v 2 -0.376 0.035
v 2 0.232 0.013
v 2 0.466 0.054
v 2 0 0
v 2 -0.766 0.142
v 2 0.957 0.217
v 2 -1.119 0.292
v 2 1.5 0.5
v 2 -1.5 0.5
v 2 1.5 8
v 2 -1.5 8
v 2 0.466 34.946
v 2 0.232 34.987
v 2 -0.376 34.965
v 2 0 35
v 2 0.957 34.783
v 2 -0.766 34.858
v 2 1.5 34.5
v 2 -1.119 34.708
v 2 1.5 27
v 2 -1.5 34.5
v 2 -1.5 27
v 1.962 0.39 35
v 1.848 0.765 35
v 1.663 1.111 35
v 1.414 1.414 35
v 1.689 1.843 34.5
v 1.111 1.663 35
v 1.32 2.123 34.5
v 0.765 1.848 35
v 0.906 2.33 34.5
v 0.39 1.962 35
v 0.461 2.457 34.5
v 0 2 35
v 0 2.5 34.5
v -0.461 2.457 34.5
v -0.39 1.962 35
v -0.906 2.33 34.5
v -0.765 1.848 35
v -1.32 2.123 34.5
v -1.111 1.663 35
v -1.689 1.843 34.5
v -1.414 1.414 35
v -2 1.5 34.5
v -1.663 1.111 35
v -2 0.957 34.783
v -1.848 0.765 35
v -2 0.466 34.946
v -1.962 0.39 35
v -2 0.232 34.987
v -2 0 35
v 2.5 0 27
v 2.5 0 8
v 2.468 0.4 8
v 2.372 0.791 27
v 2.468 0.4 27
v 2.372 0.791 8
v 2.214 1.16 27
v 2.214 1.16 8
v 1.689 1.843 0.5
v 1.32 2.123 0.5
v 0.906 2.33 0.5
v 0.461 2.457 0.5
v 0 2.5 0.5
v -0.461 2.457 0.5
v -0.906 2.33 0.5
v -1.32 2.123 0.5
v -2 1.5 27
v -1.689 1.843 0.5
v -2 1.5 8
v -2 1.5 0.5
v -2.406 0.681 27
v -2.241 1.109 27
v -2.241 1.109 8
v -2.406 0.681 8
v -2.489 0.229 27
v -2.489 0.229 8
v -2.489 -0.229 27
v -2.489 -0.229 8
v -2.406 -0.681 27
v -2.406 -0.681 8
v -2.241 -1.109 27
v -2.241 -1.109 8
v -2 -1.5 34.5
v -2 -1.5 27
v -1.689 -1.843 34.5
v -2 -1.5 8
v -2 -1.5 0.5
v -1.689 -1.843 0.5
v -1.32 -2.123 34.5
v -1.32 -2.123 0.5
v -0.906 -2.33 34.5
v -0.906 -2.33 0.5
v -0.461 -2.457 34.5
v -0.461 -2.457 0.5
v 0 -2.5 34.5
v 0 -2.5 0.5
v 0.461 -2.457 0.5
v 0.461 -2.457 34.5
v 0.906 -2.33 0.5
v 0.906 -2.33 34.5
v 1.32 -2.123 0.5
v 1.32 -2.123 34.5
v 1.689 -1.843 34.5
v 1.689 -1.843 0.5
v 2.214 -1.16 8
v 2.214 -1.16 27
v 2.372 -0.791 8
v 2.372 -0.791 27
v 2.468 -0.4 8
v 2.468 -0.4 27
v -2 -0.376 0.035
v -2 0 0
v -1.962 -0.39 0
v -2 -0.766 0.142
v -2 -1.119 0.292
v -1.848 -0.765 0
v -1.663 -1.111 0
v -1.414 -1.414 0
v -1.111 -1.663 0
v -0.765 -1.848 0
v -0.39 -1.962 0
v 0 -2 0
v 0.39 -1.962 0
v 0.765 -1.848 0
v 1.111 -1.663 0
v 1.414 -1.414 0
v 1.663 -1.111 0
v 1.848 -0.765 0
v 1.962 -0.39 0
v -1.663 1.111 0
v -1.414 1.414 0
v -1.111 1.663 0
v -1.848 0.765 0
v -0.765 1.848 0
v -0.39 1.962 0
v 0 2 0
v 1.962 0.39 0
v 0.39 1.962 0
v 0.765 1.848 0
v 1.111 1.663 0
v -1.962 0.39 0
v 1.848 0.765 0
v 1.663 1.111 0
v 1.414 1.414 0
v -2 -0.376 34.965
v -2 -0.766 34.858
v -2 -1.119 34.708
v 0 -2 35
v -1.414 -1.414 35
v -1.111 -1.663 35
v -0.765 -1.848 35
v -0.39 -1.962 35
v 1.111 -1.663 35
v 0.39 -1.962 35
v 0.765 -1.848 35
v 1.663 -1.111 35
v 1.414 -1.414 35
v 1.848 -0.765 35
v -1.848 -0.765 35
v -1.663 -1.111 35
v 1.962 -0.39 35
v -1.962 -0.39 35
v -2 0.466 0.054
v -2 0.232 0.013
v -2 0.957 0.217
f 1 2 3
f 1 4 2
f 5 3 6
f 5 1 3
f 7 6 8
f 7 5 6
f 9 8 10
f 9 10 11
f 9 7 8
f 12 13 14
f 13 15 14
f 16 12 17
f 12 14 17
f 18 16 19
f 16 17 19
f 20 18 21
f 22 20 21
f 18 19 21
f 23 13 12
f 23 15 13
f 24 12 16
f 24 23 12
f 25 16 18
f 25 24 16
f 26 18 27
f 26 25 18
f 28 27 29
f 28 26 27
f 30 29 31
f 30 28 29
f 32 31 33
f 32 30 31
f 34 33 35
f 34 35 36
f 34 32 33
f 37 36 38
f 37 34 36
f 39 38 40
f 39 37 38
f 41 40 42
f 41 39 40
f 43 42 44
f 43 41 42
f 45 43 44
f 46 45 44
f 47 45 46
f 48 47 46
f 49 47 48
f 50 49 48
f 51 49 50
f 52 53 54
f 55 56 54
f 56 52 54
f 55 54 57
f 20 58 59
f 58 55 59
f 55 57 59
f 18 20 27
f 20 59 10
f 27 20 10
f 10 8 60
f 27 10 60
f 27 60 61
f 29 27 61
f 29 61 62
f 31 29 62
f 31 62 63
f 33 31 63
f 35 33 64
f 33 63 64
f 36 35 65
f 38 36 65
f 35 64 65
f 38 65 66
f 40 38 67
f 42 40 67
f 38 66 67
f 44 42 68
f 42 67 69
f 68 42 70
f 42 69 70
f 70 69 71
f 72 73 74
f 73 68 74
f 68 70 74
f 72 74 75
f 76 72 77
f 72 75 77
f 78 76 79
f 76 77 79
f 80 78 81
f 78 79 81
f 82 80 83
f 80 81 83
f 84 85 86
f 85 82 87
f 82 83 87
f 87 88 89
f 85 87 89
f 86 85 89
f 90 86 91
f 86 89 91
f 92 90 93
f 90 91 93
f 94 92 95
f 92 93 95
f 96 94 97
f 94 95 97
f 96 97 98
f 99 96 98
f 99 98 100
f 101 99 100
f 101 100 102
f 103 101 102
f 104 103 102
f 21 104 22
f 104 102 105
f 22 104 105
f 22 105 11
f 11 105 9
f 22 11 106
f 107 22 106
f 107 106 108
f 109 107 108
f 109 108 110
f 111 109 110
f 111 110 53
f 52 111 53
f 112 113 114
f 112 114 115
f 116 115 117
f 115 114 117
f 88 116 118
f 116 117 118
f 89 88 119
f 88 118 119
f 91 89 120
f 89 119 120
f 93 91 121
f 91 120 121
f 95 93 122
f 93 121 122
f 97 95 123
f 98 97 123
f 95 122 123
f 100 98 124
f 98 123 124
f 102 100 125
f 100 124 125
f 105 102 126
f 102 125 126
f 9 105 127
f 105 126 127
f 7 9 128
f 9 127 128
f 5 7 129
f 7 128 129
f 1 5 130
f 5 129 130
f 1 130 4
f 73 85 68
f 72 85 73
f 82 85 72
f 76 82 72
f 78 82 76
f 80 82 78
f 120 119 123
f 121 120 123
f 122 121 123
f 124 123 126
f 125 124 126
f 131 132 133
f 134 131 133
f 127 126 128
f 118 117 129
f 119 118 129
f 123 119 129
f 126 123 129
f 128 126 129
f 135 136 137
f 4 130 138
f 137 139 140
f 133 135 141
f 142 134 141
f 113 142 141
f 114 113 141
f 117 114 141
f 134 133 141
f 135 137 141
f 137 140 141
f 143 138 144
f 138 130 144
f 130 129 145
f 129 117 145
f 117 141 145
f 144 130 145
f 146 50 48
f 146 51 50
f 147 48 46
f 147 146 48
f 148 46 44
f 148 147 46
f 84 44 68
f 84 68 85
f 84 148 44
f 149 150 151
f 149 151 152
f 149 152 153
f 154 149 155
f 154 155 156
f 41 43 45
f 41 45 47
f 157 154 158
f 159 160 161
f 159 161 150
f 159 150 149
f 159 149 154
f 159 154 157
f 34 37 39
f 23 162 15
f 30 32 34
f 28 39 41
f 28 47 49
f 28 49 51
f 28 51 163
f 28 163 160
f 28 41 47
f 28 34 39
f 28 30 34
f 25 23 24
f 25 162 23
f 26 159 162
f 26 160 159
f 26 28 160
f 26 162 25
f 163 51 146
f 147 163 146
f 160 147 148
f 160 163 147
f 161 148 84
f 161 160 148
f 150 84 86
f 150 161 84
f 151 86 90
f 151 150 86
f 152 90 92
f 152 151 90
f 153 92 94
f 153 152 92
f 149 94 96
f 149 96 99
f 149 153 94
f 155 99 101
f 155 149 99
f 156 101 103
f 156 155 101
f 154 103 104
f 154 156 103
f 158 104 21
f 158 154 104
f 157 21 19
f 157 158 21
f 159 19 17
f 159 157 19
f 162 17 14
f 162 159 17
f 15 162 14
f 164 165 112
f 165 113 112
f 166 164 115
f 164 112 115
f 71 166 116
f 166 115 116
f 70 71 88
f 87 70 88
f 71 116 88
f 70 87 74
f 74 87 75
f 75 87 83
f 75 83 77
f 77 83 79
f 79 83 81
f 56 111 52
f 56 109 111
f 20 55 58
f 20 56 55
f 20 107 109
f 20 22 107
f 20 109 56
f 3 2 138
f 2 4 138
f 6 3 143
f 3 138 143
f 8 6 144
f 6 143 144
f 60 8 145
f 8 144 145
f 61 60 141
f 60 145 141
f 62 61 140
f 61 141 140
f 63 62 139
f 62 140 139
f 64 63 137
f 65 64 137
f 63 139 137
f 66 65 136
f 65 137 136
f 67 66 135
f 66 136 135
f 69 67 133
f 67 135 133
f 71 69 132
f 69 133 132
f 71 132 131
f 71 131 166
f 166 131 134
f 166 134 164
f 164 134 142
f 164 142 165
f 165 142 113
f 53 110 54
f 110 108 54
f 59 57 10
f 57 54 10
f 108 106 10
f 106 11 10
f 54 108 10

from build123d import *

# Parameters (mm, degrees)
SKETCH1_R           = 2.5
BOSS_EXTRUDE1_DEPTH = 35
CHAMFER1_SIZE       = 0.5
CUT_EXTRUDE1_DEPTH  = 8


with BuildPart() as part:
    # Sketch1 → Boss-Extrude1 (new body)
    with BuildSketch(Plane.XY):
        Circle(SKETCH1_R)
    extrude(amount=BOSS_EXTRUDE1_DEPTH)

    # Chamfer1
    chamfer1_edges = [part.edges().sort_by_distance(p)[0] for p in [
        (-2.5, 0, 0),
        (-2.5, 0, 35),
    ]]
    chamfer(chamfer1_edges, length=CHAMFER1_SIZE)

    # Sketch2 → Cut-Extrude1 (cut)
    with BuildSketch(Plane.XY.offset(35)):
        Polygon((2, 1.555738269), (2, -1.555738269), (4.460999641, -1.695481282), (5.219104654, -0.46598868), (5.068266404, 0.170018194), (3.416674172, 1.653087335), (3.034604396, 1.88867152), align=None)
        Polygon((-2, 1.555738269), (-2, -1.555738269), (-2.968976112, -3.127221032), (-3.471634936, -2.94714388), (-4.717205701, -1.861261674), (-4.943269872, 1.439275222), align=None)
    cut_extrude1 = extrude(amount=-CUT_EXTRUDE1_DEPTH, mode=Mode.SUBTRACT)

    # Mirror1: Cut-Extrude1 across plane
    add(cut_extrude1.mirror(Plane.XY.offset(17.5)), mode=Mode.SUBTRACT)


solid = part.part
